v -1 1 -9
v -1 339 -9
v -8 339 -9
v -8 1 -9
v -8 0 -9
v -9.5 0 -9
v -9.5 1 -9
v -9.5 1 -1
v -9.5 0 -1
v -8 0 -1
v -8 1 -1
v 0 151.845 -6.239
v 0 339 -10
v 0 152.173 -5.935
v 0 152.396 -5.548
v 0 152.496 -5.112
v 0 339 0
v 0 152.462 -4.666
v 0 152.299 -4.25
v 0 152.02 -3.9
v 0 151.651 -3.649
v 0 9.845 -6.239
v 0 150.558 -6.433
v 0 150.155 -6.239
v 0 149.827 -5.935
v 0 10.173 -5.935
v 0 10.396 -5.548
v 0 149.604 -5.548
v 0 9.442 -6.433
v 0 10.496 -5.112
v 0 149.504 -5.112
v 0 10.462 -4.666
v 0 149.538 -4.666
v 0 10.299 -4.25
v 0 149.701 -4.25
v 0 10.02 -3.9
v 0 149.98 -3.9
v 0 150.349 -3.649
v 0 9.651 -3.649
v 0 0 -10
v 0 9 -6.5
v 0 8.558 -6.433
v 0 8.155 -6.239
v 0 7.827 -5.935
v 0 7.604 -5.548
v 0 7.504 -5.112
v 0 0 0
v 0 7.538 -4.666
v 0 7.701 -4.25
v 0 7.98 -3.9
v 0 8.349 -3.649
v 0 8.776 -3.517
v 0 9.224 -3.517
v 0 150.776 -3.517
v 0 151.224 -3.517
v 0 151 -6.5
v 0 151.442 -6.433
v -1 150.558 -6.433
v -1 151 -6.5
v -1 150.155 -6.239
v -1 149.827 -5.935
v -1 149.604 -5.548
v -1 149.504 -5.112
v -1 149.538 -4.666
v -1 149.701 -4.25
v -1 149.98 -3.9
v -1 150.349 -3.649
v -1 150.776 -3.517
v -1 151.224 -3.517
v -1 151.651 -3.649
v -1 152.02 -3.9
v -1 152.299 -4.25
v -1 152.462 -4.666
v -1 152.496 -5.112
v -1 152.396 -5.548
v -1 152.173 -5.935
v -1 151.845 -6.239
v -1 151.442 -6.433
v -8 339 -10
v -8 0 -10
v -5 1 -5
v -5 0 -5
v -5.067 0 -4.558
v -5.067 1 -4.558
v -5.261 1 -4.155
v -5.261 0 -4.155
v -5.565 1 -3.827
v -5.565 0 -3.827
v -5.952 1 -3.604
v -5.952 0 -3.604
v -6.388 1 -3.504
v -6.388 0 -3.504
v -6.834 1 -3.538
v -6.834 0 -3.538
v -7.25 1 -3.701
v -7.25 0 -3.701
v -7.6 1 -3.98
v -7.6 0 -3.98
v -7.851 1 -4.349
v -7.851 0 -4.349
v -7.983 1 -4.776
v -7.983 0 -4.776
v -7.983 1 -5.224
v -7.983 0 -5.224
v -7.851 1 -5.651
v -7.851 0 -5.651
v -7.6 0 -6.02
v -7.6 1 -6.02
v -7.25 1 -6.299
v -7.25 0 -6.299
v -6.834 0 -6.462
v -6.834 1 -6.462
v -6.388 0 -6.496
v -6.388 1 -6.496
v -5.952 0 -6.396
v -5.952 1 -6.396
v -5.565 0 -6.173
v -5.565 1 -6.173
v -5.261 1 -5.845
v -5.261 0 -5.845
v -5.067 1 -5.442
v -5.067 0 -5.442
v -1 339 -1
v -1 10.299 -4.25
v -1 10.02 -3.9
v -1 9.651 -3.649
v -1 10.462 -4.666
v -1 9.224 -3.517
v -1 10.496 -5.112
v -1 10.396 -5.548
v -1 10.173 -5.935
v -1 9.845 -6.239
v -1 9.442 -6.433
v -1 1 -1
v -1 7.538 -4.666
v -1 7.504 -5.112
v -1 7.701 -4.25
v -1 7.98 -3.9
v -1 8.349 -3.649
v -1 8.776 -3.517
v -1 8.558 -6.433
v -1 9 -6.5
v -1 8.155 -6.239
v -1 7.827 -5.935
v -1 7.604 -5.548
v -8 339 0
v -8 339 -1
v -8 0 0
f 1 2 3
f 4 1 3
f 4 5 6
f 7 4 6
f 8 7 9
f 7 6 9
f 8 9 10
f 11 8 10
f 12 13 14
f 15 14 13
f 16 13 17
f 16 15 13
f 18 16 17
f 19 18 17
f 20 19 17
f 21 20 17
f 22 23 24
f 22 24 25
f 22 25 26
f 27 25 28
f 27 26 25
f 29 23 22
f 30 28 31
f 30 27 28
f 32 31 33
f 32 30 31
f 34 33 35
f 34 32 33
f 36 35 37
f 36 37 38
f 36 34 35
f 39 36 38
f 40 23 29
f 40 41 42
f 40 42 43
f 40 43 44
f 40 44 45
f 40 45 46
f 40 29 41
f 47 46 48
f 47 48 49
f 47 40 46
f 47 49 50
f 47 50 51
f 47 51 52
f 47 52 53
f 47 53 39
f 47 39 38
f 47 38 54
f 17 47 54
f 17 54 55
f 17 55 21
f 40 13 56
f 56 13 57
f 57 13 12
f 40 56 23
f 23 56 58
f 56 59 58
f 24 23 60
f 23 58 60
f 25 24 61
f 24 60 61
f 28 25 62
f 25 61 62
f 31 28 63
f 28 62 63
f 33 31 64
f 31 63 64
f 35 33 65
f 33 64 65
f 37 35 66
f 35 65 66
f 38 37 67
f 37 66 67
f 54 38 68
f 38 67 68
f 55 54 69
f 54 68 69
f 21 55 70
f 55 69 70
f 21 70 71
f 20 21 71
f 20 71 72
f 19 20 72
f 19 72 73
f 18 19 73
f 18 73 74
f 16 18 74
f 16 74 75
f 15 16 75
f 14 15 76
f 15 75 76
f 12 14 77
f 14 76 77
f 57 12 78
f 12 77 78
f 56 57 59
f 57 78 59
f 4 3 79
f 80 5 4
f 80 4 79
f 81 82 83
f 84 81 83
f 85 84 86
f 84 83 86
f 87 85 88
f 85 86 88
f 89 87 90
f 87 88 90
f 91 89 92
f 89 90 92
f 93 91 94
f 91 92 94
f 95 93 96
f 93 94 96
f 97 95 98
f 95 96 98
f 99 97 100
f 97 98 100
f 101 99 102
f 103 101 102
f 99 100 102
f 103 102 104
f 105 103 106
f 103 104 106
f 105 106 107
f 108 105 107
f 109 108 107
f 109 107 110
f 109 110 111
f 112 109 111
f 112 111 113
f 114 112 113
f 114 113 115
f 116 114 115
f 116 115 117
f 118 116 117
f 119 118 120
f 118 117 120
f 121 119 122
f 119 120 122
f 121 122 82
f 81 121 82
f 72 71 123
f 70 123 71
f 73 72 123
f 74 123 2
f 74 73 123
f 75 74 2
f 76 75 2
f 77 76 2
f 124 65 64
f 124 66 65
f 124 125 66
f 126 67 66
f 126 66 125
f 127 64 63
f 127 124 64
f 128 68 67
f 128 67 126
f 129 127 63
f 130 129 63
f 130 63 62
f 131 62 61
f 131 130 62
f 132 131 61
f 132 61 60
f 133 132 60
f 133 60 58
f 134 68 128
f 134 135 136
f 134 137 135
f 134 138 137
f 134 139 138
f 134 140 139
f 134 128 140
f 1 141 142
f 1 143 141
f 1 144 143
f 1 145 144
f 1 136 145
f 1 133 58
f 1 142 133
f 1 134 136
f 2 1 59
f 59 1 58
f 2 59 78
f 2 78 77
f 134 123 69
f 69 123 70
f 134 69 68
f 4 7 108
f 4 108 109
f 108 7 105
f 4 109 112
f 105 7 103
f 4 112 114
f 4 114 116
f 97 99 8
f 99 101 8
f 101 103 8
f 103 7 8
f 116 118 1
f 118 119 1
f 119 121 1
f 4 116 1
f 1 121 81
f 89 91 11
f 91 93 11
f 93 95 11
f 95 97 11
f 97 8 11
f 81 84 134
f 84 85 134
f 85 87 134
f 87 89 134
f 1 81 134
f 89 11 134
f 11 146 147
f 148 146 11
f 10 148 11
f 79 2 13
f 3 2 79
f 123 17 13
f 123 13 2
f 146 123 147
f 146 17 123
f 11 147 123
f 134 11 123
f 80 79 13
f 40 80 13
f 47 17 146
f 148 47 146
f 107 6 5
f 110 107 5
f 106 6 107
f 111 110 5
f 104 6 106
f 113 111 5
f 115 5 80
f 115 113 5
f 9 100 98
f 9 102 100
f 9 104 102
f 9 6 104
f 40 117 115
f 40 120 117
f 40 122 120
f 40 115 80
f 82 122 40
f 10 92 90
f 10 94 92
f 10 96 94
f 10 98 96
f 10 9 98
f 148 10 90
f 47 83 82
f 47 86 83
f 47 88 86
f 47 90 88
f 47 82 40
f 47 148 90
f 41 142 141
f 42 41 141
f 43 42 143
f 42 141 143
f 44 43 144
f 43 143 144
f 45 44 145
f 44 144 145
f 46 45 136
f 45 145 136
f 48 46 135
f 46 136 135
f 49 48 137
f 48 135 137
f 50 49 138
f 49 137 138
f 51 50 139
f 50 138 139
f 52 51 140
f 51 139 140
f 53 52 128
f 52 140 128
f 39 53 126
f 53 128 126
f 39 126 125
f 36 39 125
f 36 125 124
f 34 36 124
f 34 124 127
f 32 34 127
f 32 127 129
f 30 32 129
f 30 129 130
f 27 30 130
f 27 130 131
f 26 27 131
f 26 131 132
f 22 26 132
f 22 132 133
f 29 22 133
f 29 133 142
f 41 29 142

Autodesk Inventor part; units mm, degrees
ref_plane "YZ Plane" through (0, 0, 0) normal (1, 0, 0) x (0, 1, 0)
ref_plane "XZ Plane" through (0, 0, 0) normal (0, 1, 0) x (-1, 0, 0)
ref_plane "XY Plane" through (0, 0, 0) normal (0, 0, 1) x (1, 0, 0)
sketch "Sketch1" plane through (0, 0, 0) normal (0, 1, 0) x (-1, 0, 0)
  line L0 (0, 0) -> (8, 0)
  line L1 (8, -10) -> (0, -10)
  line L2 (0, -10) -> (0, 0)
  line L3 (8, -1) -> (1, -1)
  line L4 (1, -1) -> (1, -9)
  line L5 (1, -9) -> (8, -9)
  line L6 (8, 0) -> (8, -1)
  line L7 (8, -9) -> (8, -10)
  dimension "d0" = 1
  dimension "d1" = 1
  dimension "d2" = 1
  dimension "d3" = 10
  dimension "d4" = 8
extrude "Extrusion1" add sketch "Sketch1" along normal blind 339
sketch "Sketch2" plane through (0, 0, 0) normal (1, 0, 0) x (0, 0, -1)
  line L0 (0, 0) -> (10, 0) projected
  line L1 (0, 0) -> (0, 339) projected
  point P0 (5, 9)
  dimension "d7" = 9
  dimension "d8" = 5
hole "Hole1" at (0, 9, -5) direction (-1, 0, 0) diameter 3 depth 8 tip angle 118
sketch "Sketch3" plane through (0, 0, 0) normal (1, 0, 0) x (0, 0, -1)
  line L0 (0, 0) -> (0, 339) projected
  line L1 (0, 339) -> (10, 339) projected
  point P0 (5, 206.5)
  point P1 (5, 339)
  dimension "d16" = 5
  dimension "d17" = 132.5
hole "Hole2" [suppressed]
sketch "Sketch5" plane through (0, 0, 0) normal (1, 0, 0) x (0, 0, -1)
  line L0 (0, 0) -> (0, 339) projected
  circle A0 centre (5, 9) radius 1.5 projected
  point P0 (5, 151)
  dimension "d25" = 5
  dimension "d26" = 142
hole "Hole3" at (0, 151, -5) direction (-1, 0, 0) diameter 3 depth 8 tip angle 118
sketch "Sketch11" plane through (0, 0, 0) normal (0, -1, 0) x (1, 0, 0)
  circle A0 centre (-6.5, -5) radius 1.5
  line L0 (-8, -10) -> (-8, -9) projected
  line L1 (0, -10) -> (-8, -10) projected
  line L2 (-8, -9) -> (-1, -9) projected
  line L3 (-1, -9) -> (-9.5, -9)
  line L4 (-9.5, -9) -> (-9.5, -1)
  line L5 (-9.5, -1) -> (-1, -1)
  line L6 (-1, -1) -> (-1, -9)
  point P0 (0, 0)
  point P1 (-8, -9.5)
  dimension "d63" = 3
  dimension "d64" = 1.5
  dimension "d65" = 5
  dimension "d66" = 3
extrude "Extrusion3" add sketch "Sketch11" against normal blind 1
properties part number "Stringer" material "Aluminum"
